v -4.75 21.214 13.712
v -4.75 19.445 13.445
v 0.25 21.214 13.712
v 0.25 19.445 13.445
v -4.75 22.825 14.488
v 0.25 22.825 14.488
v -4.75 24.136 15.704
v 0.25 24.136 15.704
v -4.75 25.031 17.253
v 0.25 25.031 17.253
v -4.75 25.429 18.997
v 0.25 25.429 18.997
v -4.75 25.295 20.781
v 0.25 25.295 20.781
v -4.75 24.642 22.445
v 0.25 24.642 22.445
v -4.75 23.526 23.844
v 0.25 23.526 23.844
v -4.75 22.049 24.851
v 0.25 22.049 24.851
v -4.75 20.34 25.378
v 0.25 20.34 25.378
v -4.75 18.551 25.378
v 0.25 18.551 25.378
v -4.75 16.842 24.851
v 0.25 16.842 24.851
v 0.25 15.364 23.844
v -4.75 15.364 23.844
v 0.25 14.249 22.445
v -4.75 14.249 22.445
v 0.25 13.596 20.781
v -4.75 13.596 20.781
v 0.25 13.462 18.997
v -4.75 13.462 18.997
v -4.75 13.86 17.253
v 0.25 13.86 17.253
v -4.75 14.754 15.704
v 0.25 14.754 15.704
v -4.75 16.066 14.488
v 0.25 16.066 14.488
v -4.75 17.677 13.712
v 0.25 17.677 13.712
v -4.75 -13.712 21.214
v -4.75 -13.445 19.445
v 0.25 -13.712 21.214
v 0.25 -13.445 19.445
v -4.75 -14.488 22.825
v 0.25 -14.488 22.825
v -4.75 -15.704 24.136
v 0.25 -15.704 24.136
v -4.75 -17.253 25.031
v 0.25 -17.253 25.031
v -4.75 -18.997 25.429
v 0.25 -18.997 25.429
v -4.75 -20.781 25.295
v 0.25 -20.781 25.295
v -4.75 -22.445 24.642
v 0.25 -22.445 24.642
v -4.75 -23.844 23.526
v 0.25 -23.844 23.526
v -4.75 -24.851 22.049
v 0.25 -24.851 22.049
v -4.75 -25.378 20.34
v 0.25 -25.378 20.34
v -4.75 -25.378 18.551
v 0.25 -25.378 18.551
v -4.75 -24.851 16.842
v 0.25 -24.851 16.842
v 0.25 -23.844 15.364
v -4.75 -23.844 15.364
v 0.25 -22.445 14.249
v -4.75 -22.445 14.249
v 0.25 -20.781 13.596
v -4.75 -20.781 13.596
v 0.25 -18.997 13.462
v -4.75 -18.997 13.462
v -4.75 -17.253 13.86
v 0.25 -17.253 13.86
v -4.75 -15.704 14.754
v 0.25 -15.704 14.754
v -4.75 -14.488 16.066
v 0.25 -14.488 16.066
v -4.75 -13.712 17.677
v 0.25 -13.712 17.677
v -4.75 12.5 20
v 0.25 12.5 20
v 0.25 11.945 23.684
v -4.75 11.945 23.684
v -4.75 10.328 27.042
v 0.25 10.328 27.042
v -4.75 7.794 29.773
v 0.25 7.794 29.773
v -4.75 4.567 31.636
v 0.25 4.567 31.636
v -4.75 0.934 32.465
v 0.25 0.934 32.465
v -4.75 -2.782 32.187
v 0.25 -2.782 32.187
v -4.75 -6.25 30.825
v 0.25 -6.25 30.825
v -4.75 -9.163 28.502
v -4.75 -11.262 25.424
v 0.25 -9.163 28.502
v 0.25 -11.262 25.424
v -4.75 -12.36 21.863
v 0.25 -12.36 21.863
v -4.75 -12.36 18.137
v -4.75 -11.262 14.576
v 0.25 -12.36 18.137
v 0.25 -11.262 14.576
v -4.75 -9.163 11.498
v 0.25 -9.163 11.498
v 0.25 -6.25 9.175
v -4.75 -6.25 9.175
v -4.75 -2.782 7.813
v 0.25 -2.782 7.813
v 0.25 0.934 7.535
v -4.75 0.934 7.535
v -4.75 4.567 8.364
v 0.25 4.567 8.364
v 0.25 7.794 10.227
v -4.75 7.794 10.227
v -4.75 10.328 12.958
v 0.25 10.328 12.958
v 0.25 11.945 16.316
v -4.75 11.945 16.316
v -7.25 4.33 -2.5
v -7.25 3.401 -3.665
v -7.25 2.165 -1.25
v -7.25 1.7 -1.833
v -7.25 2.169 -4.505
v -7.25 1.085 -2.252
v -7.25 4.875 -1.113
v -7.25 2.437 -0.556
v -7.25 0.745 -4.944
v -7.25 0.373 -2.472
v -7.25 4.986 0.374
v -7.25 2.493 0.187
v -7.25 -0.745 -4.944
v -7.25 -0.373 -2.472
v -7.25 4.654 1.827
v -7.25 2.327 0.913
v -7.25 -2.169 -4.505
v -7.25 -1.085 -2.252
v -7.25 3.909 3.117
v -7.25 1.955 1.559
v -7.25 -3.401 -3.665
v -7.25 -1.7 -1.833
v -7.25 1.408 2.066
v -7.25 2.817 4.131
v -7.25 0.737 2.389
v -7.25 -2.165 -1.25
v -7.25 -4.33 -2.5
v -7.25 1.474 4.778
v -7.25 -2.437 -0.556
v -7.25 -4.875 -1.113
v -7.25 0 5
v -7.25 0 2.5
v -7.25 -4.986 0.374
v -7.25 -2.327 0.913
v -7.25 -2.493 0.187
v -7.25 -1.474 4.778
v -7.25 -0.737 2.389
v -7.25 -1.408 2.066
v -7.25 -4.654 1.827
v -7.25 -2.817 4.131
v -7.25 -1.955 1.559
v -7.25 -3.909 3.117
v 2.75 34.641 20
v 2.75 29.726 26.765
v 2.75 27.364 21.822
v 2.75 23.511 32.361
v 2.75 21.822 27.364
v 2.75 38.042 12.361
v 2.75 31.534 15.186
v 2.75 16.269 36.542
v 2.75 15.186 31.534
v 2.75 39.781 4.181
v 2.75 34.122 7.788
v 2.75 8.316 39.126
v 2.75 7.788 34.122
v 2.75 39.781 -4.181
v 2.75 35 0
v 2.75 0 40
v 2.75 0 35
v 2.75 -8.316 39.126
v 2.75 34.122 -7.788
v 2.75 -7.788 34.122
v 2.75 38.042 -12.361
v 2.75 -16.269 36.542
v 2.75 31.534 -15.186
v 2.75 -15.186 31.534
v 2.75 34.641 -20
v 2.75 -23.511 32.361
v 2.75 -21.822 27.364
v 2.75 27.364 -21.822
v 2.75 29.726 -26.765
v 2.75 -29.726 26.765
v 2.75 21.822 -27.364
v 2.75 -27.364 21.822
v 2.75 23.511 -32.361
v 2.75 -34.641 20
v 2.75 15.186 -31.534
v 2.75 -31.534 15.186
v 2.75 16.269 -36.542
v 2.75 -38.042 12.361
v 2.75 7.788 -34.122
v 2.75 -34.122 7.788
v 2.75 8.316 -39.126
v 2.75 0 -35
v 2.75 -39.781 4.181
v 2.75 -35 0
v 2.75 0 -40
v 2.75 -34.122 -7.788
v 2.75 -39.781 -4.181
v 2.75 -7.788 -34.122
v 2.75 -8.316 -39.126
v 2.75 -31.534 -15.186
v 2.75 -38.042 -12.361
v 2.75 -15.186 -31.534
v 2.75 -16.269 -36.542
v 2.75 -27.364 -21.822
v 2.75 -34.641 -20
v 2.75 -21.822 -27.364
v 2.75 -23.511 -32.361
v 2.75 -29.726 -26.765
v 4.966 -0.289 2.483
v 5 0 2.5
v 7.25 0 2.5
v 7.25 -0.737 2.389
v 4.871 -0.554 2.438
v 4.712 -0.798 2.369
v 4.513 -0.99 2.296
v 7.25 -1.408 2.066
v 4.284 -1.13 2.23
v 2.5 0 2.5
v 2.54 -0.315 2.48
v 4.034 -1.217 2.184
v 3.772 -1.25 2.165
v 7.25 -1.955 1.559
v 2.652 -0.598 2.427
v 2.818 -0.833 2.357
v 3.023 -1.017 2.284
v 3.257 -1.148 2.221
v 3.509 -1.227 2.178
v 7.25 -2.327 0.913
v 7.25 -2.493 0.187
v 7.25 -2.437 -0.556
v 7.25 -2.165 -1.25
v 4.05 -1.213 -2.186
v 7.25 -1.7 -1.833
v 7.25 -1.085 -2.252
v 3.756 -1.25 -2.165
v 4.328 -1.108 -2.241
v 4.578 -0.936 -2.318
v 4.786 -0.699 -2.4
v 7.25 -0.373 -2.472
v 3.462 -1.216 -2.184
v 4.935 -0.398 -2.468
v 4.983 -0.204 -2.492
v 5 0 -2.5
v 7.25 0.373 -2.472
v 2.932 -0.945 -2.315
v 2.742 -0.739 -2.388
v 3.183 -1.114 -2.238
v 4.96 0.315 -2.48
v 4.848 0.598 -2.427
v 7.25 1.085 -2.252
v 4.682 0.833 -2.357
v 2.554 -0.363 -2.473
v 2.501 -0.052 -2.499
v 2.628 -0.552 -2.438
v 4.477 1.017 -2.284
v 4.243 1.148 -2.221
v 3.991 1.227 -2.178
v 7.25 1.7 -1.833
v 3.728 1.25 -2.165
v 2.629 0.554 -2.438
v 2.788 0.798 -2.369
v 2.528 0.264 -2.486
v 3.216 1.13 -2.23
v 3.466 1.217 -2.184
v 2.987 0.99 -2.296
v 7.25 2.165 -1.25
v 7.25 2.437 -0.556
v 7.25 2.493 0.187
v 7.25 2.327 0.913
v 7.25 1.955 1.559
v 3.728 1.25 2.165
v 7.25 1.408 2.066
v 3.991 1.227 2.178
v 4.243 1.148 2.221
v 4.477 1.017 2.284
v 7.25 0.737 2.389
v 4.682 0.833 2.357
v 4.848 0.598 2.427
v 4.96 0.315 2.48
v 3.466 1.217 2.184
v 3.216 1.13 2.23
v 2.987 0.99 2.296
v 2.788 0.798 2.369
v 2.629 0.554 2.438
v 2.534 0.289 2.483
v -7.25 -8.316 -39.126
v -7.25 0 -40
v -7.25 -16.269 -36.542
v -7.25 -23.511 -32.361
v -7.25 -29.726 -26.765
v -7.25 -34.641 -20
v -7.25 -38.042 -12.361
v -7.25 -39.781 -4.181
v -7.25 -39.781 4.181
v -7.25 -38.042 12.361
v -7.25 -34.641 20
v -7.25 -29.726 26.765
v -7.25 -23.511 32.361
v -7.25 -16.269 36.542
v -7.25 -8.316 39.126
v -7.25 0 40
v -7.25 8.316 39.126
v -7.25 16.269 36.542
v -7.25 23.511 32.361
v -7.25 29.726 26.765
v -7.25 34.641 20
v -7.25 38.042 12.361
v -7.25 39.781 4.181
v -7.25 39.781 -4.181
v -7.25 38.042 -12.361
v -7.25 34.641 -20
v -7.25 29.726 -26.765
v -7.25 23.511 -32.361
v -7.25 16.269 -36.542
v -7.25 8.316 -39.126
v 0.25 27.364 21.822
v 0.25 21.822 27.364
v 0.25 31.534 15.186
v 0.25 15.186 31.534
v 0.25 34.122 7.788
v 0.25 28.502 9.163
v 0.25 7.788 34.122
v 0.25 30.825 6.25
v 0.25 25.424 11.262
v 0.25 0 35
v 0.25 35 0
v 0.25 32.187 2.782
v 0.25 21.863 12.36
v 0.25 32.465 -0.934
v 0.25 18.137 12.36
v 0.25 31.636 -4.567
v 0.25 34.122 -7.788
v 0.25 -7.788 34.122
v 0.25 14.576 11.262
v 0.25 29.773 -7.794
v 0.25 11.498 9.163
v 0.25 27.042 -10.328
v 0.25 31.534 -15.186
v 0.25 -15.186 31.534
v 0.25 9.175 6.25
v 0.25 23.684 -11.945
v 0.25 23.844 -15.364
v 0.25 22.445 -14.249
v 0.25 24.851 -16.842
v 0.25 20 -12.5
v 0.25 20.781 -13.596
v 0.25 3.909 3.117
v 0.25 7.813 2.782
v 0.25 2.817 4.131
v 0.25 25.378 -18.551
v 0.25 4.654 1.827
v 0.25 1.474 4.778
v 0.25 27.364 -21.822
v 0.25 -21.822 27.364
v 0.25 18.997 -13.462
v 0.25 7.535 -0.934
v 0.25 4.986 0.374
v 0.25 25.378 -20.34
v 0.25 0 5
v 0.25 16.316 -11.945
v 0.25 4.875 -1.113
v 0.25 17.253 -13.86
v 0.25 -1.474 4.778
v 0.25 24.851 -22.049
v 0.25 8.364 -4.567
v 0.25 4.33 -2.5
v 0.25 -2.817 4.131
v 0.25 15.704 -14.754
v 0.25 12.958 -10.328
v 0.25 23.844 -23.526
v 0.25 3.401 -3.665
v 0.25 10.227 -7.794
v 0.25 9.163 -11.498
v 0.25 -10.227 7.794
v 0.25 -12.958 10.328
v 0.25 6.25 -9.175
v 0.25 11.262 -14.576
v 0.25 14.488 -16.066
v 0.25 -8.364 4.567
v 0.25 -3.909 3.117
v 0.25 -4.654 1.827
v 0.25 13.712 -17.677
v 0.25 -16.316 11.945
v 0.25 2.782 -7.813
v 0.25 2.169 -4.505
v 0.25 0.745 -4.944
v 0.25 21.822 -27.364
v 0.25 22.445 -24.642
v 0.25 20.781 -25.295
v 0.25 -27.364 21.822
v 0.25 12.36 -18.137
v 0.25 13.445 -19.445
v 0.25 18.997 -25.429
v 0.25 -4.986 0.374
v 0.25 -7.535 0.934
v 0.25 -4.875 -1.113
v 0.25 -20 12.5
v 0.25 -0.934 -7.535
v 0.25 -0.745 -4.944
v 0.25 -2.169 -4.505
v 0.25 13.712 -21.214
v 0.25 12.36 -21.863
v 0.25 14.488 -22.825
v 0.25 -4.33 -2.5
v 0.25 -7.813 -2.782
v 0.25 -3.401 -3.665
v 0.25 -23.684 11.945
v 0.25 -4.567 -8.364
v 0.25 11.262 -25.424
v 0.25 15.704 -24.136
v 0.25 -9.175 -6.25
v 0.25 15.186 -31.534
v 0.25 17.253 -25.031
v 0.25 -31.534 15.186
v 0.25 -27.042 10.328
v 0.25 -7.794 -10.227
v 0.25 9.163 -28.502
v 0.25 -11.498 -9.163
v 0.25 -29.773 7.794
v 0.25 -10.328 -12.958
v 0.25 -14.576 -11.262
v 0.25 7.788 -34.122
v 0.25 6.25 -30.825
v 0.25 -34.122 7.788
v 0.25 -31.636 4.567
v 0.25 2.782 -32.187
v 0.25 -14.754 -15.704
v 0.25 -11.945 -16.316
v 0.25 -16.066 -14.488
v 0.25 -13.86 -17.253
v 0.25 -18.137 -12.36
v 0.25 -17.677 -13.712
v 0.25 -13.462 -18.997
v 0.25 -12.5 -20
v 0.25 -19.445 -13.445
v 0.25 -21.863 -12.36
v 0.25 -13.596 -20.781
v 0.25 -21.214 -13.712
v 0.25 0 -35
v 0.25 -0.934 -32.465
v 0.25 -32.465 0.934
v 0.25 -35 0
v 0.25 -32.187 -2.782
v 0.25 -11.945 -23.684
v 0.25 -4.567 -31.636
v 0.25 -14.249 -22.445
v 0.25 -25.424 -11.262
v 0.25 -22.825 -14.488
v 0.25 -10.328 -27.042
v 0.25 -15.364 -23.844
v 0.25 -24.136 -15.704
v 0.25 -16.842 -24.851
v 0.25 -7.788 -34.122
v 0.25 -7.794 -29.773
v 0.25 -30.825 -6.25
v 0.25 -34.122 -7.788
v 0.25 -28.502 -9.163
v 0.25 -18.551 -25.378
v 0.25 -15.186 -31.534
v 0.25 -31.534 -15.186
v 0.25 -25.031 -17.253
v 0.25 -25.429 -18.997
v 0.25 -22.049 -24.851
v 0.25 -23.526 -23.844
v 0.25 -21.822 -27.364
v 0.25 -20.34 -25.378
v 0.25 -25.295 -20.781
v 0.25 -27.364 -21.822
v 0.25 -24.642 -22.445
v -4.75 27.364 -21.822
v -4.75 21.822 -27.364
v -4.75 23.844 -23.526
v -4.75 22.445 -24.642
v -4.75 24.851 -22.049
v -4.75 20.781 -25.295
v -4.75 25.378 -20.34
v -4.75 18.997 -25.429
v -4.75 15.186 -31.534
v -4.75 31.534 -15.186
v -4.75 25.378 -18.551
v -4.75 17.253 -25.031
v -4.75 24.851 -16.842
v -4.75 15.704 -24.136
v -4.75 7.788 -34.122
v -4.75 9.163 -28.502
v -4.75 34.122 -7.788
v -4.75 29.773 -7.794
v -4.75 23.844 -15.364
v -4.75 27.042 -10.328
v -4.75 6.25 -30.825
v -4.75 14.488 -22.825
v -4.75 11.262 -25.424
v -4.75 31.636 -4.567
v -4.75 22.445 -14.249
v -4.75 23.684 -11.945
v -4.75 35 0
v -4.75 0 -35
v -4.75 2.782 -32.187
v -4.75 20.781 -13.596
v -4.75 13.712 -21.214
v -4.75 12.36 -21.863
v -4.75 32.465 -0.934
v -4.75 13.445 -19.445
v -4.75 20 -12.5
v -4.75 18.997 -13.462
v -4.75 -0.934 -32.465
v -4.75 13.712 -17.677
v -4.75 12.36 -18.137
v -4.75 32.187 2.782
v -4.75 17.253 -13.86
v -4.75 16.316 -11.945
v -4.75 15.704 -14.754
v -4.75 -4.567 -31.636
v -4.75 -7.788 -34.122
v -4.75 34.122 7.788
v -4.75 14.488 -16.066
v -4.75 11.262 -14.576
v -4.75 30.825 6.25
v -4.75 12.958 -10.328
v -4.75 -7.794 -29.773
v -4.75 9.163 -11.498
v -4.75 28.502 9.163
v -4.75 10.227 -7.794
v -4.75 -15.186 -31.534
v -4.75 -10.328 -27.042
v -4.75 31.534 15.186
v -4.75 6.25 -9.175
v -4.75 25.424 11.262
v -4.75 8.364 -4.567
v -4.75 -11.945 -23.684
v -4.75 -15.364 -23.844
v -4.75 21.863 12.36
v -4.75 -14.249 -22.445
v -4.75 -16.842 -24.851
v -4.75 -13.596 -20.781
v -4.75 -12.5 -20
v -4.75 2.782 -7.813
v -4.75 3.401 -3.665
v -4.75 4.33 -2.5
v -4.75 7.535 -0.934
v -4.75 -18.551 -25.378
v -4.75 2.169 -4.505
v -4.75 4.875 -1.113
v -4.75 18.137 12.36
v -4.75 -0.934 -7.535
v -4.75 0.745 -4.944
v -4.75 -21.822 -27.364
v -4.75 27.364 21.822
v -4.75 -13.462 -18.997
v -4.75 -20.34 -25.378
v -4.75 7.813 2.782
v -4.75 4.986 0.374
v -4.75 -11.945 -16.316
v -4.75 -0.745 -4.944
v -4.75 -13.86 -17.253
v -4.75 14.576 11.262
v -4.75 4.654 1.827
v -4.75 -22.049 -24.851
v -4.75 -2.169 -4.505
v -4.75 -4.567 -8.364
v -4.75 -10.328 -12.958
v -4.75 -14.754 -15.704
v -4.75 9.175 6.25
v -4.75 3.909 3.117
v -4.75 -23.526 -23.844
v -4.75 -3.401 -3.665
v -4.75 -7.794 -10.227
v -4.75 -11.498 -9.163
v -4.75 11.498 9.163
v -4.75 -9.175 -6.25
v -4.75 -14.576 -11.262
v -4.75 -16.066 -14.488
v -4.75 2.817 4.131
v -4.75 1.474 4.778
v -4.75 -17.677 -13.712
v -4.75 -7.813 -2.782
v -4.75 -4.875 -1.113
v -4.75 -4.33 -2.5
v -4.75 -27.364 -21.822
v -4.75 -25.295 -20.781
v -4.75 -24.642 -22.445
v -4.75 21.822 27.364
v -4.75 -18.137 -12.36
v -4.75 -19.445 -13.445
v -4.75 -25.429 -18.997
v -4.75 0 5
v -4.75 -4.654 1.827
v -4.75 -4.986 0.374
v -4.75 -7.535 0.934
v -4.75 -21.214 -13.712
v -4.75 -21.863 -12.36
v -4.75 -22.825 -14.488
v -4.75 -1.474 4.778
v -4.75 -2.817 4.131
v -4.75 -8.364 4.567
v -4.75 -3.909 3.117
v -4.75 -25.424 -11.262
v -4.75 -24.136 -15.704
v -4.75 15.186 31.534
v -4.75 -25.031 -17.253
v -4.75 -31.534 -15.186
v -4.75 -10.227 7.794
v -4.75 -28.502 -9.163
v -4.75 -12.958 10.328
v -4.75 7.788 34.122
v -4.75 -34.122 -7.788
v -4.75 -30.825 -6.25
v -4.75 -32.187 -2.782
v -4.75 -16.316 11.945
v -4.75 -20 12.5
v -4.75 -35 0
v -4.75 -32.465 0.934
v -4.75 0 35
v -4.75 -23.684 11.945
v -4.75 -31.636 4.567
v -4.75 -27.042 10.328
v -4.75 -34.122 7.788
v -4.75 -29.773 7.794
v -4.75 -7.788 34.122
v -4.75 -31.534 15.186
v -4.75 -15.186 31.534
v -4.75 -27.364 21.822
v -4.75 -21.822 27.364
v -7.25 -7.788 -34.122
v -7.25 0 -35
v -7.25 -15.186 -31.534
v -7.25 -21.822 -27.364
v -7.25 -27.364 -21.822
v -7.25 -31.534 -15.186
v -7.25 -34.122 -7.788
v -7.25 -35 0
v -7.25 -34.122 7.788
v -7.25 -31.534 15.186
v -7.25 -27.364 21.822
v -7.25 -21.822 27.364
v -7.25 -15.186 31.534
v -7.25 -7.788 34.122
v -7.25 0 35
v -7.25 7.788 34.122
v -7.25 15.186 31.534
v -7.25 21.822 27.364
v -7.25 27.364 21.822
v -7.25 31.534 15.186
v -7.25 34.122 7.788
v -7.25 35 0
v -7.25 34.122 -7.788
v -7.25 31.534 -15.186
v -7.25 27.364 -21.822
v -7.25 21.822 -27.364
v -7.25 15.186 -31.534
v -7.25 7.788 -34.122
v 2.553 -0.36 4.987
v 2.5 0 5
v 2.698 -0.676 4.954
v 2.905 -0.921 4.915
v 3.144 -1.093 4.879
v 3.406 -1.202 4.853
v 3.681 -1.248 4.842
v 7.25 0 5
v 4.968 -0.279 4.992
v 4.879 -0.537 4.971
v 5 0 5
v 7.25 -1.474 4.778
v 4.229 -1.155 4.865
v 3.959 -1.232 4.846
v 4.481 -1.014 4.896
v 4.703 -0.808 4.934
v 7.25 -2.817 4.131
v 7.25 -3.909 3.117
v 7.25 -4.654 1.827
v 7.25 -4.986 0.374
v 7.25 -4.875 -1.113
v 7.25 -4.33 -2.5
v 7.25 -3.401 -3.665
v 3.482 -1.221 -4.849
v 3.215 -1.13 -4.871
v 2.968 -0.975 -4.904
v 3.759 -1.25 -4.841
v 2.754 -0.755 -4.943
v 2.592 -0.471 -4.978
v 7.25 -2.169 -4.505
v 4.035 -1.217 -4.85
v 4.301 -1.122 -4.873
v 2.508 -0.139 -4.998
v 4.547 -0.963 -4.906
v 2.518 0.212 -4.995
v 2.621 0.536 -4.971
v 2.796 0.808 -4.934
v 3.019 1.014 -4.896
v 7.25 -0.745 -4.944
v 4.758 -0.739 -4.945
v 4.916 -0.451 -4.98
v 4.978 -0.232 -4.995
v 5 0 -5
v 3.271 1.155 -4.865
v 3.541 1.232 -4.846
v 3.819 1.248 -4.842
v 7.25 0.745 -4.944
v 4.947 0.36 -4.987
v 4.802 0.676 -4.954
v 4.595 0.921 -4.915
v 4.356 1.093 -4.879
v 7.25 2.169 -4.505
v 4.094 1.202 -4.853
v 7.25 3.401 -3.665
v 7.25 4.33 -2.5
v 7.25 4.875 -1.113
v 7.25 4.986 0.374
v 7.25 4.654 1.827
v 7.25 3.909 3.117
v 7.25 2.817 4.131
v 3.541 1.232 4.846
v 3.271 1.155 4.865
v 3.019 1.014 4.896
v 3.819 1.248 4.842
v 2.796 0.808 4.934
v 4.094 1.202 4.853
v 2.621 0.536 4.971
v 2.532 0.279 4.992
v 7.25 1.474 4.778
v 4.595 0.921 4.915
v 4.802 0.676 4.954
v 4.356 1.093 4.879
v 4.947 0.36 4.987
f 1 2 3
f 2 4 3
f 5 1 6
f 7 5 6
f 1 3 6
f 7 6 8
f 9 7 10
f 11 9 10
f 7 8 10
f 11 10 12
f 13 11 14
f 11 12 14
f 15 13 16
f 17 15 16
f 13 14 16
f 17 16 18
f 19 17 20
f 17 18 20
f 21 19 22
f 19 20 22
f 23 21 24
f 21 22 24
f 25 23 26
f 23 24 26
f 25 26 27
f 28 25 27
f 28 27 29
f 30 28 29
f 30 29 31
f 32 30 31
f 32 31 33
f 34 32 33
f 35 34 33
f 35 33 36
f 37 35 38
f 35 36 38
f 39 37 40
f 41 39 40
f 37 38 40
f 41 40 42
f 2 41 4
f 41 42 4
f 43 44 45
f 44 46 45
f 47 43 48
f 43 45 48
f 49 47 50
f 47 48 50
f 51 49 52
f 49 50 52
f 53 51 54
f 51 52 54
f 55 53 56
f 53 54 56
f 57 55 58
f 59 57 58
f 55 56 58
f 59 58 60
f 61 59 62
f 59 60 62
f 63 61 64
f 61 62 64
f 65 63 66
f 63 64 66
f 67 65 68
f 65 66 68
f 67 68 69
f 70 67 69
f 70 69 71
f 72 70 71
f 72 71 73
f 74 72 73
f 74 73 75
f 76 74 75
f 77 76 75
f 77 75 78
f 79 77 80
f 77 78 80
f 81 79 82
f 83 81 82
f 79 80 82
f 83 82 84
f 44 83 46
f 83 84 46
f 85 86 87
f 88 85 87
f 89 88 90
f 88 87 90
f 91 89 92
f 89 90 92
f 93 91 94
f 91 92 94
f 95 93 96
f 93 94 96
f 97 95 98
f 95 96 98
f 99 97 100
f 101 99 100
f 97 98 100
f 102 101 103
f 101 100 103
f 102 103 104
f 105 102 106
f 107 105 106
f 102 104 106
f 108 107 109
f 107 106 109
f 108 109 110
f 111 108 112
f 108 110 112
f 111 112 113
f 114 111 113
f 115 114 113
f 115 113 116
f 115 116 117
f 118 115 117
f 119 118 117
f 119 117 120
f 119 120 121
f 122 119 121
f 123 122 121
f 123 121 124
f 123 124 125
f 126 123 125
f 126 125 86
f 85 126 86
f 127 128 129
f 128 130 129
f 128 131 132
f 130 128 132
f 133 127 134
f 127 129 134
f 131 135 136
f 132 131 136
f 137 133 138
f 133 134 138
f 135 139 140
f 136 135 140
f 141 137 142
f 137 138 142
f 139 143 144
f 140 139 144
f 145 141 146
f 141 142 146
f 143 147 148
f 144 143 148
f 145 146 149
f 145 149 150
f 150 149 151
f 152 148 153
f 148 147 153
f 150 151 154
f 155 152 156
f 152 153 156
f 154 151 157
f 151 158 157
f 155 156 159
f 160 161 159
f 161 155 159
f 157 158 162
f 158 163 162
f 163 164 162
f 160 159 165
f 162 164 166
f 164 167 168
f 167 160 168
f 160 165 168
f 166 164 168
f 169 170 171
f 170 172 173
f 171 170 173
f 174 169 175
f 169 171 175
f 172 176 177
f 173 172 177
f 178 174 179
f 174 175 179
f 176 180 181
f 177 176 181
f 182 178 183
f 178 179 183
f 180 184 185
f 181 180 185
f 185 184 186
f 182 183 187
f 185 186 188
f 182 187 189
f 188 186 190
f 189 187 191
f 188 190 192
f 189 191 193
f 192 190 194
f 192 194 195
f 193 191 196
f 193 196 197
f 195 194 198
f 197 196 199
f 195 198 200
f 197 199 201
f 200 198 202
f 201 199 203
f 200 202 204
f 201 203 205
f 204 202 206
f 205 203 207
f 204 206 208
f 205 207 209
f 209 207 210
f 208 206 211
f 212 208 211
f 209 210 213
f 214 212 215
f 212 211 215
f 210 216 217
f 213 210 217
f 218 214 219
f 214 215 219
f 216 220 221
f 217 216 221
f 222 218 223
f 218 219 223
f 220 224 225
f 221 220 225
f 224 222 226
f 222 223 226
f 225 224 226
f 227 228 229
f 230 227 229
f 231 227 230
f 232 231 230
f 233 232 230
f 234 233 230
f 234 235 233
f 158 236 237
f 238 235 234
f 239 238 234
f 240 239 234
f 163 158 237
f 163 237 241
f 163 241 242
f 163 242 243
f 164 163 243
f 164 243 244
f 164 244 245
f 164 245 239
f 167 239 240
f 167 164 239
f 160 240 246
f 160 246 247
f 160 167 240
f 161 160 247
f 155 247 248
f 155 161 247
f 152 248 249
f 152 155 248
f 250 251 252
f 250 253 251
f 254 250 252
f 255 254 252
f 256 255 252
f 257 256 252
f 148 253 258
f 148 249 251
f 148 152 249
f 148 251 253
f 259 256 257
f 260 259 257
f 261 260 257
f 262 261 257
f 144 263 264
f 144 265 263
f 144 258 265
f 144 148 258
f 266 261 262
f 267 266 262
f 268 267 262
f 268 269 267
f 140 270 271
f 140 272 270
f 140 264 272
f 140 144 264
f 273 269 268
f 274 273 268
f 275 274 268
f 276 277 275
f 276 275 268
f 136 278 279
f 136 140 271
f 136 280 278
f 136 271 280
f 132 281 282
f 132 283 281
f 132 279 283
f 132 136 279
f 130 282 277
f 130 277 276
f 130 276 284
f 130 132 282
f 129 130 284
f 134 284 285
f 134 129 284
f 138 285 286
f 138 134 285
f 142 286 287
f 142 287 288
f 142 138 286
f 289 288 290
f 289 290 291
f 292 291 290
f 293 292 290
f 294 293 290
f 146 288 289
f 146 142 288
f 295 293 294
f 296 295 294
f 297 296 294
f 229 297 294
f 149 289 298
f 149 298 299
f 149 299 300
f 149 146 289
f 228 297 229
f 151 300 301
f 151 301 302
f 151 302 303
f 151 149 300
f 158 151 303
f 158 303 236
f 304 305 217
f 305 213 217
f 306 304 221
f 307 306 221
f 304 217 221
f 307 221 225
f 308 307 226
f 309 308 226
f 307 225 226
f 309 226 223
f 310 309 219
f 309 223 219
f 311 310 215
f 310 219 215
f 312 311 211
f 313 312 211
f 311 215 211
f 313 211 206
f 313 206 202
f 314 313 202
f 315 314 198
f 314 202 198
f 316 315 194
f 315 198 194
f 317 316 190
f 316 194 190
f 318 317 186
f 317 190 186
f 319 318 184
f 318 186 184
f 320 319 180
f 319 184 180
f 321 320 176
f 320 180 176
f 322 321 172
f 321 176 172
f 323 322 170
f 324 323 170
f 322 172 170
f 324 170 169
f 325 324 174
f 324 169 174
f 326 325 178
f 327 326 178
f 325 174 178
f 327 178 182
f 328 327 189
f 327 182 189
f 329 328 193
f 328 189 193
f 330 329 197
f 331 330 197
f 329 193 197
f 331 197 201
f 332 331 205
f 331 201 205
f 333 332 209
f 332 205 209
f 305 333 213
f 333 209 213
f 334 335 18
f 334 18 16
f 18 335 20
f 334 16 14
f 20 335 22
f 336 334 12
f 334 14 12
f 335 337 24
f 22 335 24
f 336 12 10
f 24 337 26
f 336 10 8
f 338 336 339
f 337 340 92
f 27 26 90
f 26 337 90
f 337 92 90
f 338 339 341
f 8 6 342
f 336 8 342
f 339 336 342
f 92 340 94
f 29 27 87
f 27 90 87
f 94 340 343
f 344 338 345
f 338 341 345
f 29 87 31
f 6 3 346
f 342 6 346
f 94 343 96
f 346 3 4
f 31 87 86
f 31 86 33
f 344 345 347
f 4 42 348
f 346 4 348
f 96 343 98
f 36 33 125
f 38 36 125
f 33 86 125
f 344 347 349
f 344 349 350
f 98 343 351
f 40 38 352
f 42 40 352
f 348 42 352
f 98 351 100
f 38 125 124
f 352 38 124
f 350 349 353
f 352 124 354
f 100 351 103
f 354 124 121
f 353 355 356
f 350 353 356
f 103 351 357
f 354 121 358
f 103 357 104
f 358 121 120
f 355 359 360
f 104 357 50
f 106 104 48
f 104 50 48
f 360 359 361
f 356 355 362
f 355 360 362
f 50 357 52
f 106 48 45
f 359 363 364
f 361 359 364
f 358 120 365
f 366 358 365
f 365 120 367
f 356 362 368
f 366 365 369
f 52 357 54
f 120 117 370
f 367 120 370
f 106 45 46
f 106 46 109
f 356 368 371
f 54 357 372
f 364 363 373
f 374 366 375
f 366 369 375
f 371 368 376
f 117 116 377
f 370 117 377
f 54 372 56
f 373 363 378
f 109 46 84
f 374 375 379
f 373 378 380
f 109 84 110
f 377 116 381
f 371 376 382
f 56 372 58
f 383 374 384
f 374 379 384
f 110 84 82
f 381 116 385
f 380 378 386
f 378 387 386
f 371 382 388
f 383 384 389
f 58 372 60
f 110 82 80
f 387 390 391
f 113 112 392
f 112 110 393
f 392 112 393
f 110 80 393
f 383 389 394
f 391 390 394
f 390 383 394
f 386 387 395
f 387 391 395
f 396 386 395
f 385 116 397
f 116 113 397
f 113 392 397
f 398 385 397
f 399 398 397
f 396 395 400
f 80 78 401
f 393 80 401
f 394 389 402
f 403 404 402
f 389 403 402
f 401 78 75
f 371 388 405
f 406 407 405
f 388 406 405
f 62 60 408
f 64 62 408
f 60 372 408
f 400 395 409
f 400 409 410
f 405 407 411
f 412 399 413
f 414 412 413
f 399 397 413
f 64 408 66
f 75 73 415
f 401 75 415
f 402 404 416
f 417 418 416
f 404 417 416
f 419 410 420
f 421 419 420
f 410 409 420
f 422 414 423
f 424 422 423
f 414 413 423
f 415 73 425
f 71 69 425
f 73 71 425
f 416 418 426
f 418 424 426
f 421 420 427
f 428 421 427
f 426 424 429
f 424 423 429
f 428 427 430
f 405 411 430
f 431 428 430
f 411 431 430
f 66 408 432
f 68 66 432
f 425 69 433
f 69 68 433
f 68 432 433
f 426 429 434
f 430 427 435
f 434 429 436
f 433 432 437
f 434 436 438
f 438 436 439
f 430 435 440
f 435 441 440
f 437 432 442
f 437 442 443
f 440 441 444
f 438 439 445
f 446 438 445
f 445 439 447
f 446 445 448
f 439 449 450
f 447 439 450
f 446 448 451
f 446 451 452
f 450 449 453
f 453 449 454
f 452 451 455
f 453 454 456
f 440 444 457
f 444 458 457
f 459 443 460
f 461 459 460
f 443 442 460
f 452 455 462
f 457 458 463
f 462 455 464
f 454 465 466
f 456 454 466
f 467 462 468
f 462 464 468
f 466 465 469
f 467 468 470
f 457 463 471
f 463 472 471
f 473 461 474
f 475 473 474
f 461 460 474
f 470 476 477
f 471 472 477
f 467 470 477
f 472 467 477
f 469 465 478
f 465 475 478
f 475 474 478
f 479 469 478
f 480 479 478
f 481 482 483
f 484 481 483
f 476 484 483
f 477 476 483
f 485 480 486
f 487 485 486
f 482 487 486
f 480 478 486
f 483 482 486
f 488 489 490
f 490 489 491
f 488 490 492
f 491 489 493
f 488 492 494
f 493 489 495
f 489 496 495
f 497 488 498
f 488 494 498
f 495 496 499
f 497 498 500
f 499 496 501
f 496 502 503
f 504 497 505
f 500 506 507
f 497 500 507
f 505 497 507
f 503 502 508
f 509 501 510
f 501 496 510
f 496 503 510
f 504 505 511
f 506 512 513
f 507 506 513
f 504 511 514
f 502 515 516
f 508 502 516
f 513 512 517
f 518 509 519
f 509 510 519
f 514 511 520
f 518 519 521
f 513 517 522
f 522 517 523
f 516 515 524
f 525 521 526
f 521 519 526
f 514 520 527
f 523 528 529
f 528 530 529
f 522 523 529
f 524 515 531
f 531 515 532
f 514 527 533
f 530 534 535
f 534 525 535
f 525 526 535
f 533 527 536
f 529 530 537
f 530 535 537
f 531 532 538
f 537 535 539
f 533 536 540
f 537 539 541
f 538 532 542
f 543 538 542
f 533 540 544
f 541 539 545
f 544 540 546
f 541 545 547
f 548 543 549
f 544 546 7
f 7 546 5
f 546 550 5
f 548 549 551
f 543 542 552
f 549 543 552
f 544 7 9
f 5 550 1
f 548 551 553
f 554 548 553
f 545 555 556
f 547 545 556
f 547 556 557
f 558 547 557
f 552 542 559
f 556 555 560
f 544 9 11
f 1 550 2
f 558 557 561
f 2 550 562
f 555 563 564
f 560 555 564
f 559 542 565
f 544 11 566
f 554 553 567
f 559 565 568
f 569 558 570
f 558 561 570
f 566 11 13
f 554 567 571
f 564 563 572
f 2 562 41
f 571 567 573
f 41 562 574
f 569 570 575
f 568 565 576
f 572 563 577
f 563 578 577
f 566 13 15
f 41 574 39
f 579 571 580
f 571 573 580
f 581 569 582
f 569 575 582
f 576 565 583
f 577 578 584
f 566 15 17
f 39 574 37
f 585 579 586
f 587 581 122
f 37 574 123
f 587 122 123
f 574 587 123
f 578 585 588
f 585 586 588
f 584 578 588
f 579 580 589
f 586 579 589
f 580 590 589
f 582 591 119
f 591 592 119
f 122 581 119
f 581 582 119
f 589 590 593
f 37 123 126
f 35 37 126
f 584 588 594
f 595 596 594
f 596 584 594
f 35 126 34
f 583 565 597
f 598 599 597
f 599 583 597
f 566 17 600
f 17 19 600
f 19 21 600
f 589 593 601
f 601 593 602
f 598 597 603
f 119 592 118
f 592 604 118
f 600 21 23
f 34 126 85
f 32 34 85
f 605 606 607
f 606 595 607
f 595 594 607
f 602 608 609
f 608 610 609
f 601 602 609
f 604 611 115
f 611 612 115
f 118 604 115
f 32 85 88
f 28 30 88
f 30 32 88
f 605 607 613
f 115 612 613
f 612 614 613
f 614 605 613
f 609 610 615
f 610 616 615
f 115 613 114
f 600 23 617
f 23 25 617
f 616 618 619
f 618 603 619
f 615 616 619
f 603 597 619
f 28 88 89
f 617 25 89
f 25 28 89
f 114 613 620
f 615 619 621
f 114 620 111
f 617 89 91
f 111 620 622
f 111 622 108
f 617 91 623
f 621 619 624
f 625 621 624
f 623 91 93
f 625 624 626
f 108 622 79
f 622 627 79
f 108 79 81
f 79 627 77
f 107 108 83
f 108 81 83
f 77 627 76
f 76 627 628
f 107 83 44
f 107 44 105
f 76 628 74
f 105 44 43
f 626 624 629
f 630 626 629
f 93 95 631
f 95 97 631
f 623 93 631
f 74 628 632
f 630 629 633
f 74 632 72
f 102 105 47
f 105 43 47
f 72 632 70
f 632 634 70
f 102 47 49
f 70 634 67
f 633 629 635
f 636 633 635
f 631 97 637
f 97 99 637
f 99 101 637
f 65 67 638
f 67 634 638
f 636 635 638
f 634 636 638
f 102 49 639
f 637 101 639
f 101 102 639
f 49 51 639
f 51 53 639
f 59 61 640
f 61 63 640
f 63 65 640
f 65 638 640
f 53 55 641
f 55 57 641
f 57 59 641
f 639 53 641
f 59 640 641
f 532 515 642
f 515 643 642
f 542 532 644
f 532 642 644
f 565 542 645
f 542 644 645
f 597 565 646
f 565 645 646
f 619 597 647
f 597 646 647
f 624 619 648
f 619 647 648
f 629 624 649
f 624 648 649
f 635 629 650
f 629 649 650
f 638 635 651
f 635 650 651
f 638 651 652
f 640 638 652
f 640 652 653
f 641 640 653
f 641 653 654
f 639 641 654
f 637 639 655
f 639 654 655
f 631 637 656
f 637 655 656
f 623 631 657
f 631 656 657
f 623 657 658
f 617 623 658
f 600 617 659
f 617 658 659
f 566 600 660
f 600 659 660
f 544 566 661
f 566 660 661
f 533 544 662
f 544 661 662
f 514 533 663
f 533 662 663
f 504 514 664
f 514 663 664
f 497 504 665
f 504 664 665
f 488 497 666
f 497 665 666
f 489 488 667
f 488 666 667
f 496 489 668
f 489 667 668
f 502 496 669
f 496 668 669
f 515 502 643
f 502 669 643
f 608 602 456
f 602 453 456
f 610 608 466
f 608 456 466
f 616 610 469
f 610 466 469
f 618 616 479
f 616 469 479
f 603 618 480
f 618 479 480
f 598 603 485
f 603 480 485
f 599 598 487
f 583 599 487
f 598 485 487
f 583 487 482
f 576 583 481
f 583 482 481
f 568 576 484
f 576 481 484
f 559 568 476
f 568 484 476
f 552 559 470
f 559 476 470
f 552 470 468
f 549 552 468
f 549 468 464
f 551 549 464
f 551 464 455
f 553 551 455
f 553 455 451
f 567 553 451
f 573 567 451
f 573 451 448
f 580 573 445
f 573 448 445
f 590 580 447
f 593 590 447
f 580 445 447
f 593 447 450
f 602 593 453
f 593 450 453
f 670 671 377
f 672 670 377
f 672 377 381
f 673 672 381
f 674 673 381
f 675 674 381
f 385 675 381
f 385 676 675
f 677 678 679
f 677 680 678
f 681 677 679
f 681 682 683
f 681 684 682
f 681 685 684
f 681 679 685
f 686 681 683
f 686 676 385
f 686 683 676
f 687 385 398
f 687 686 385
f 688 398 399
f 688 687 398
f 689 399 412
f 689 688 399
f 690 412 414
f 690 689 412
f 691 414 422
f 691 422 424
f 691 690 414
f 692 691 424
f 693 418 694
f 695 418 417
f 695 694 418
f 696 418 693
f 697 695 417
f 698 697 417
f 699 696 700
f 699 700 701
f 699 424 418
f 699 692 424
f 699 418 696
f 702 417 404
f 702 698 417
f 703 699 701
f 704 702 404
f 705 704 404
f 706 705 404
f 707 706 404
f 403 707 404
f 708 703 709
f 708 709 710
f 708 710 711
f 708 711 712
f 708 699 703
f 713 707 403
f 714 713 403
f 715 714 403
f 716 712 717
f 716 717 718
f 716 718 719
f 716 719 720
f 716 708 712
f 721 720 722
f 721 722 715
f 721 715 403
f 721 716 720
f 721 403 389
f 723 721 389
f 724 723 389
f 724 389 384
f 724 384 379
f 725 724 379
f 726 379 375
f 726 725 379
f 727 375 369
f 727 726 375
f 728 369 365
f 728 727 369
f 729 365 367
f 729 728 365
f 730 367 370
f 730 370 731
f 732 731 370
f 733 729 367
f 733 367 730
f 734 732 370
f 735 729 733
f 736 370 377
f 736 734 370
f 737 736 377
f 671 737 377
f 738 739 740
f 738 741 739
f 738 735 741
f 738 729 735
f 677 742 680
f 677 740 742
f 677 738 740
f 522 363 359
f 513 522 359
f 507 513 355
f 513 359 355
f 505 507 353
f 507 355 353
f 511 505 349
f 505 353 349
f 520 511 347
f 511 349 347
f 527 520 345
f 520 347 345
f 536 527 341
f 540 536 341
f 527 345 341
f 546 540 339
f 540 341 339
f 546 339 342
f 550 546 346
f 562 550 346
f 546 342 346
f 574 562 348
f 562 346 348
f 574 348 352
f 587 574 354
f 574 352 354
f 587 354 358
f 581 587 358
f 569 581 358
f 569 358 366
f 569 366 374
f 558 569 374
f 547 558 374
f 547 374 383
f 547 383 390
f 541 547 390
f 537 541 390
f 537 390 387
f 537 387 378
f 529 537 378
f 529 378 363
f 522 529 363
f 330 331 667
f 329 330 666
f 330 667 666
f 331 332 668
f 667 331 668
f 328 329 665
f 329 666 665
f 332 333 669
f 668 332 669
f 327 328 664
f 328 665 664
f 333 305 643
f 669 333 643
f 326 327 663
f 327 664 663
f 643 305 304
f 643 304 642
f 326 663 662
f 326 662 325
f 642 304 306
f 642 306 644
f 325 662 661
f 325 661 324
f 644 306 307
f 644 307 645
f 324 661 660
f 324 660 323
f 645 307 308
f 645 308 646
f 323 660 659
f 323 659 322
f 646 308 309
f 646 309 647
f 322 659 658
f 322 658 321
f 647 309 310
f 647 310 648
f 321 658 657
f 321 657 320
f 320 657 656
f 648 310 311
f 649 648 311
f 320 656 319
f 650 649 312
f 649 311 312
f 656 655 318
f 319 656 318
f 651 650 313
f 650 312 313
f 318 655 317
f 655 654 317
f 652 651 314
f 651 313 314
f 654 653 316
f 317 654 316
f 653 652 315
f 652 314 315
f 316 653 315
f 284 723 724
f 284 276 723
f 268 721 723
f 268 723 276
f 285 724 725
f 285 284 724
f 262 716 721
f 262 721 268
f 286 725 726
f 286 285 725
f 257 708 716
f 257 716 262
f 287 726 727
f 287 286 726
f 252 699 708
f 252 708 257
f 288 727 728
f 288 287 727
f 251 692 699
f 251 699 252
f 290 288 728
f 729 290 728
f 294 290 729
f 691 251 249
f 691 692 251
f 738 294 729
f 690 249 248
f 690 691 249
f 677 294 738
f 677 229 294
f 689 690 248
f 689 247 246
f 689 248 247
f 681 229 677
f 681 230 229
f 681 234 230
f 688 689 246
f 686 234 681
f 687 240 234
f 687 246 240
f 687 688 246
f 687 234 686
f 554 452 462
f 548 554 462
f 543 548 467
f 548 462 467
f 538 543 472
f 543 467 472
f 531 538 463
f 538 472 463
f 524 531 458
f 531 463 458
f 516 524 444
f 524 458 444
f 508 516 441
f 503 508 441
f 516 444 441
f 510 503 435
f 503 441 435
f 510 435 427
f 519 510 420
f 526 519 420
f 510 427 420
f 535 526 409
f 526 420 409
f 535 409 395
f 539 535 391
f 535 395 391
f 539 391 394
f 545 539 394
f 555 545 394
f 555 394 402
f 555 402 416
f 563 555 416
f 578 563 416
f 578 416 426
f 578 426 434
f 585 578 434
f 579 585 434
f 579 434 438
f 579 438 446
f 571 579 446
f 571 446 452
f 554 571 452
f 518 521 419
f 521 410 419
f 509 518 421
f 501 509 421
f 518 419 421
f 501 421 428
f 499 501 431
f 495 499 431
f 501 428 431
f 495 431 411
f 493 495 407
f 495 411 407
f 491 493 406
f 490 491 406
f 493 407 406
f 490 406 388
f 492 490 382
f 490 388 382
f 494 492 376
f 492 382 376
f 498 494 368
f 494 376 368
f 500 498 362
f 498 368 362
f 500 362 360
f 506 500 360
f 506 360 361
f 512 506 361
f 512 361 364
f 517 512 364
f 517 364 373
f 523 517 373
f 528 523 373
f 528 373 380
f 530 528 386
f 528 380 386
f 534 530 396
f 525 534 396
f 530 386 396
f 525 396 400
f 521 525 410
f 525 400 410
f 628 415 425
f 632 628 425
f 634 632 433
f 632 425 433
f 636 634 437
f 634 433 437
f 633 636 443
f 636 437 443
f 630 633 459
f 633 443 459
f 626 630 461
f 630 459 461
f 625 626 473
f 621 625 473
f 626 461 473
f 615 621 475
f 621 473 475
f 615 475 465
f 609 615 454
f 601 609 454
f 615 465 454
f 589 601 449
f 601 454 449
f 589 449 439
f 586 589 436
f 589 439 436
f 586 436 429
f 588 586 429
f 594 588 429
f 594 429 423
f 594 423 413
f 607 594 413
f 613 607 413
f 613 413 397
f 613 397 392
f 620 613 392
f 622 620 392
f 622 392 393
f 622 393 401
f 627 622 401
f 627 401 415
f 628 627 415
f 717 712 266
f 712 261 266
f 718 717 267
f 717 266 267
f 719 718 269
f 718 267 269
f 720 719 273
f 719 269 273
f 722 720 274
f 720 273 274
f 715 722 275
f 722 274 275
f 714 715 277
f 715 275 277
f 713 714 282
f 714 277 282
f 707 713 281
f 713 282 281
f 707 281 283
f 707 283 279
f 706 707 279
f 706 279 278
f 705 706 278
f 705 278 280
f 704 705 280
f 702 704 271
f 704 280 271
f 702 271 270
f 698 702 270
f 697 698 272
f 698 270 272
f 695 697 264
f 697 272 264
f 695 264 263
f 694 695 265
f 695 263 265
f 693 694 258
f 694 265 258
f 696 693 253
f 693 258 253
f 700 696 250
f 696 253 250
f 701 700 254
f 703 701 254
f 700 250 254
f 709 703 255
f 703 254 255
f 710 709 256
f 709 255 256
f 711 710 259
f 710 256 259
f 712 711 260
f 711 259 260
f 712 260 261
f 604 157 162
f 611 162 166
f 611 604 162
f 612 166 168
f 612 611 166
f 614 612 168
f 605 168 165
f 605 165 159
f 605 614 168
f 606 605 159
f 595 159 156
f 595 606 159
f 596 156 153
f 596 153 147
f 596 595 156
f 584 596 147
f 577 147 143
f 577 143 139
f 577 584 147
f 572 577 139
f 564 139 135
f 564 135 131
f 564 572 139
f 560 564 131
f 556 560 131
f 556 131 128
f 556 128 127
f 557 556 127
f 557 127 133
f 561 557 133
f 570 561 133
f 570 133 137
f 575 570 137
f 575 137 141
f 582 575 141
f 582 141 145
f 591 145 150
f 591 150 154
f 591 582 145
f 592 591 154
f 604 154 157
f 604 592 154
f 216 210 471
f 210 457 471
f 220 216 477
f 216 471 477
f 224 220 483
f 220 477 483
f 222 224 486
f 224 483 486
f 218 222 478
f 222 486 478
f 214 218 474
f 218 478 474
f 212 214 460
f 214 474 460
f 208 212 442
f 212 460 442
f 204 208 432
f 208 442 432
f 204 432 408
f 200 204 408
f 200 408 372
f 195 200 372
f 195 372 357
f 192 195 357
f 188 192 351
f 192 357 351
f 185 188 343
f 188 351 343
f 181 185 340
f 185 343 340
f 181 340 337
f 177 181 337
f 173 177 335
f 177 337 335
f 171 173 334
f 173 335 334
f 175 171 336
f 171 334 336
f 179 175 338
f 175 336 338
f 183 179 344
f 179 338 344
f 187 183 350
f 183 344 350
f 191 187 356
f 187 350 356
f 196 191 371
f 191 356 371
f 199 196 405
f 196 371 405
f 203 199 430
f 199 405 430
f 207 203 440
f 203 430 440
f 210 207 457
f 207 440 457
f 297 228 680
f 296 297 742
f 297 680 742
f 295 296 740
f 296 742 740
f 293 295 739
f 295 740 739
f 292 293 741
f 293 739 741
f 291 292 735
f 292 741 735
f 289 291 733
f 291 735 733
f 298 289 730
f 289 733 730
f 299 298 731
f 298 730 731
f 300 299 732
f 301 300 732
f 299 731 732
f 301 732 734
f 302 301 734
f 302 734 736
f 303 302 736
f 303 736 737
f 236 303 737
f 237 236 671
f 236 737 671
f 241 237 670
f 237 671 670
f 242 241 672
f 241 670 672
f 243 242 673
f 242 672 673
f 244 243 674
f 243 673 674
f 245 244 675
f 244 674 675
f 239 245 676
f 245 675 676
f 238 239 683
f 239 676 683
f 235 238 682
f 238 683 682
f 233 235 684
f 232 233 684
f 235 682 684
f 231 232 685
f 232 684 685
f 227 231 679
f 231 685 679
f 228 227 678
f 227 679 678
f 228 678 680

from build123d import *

# Parameters (mm, degrees)
SKETCH1_R           = 5
SKETCH1_R_2         = 2.5
BOSS_EXTRUDE1_DEPTH = 7.25
SKETCH5_R           = 12.5
SKETCH5_R_2         = 6
CUT_EXTRUDE1_DEPTH  = 58.063561053
CIRPATTERN1_COUNT   = 4
SKETCH6_R           = 1.25
CUT_EXTRUDE2_DEPTH  = 10


with BuildPart() as part:
    # Sketch1 → Boss-Extrude1 (new, symmetric)
    with BuildSketch(Plane(origin=(0, 0, 0), x_dir=(0, 0, -1), z_dir=(1, 0, 0))):
        with Locations(Location((0, 0, 0), (0, 0, 180))):
            Circle(SKETCH1_R)
        with Locations(Location((0, 0, 0), (0, 0, 180))):
            Circle(SKETCH1_R_2, mode=Mode.SUBTRACT)
    extrude(amount=BOSS_EXTRUDE1_DEPTH, both=True)

    # Sketch4 → Revolve4 (revolve)
    with BuildSketch(Plane.XY, mode=Mode.PRIVATE) as revolve4_sk:
        Polygon((-4.75, 5), (-4.75, 35), (-7.25, 35), (-7.25, 40), (2.75, 40), (2.75, 35), (0.25, 35), (0.25, 5), align=None)
    revolve(revolve4_sk.sketch.rotate(Axis((0, 0, 0), (-1, 0, 0)), 90), axis=Axis((0, 0, 0), (-1, 0, 0)))

    # Sketch5 → Cut-Extrude1 (cut, symmetric)
    with BuildSketch(Plane(origin=(0.25, 0, 0), x_dir=(0, 0, -1), z_dir=(1, 0, 0))):
        with Locations((0, 20)):
            Circle(SKETCH5_R)
        with Locations((-19.445436483, 19.445436483)):
            Circle(SKETCH5_R_2)
    cut_extrude1 = extrude(amount=CUT_EXTRUDE1_DEPTH, both=True, mode=Mode.SUBTRACT)

    # CirPattern1: Cut-Extrude1 ×4 about axis
    cirpattern1_axis = Axis((0, 0, 0), (1, 0, 0))
    for i in range(1, CIRPATTERN1_COUNT):
        add(cut_extrude1.rotate(cirpattern1_axis, i * 360 / CIRPATTERN1_COUNT), mode=Mode.SUBTRACT)

    # Sketch6 → Cut-Extrude2 (cut, symmetric)
    with BuildSketch(Plane.XY):
        with Locations((3.75, 0)):
            Circle(SKETCH6_R)
    extrude(amount=CUT_EXTRUDE2_DEPTH, both=True, mode=Mode.SUBTRACT)


solid = part.part
